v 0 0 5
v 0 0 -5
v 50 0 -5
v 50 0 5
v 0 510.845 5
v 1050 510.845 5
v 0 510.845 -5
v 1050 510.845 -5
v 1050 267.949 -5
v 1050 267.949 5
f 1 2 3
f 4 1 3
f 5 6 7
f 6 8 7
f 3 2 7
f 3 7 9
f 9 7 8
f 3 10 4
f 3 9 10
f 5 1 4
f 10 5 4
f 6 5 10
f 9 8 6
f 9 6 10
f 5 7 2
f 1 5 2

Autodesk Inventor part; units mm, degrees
sketch "Эскиз1" plane through (0, 0, 0) normal (0, 0, 1) x (1, 0, 0)
  line L0 (0, 613.0143) -> (0, -102.169) projected
  line L1 (-210, 0) -> (1260, 0) projected
  line L2 (0, 0) -> (50, 0)
  line L3 (1050, 510.8452) -> (0, 510.8452)
  line L4 (0, 0) -> (0, 510.8452)
  line L5 (1050, 510.8452) -> (1050, 267.9492)
  line L6 (1050, 267.9492) -> (50, 0)
  dimension "d7" = 1050
  dimension "d8" = 50
  dimension "d9" = 15
extrude "Выдавливание1" add sketch "Эскиз1" along normal mid plane 10
properties part number "ДетальДударь"
